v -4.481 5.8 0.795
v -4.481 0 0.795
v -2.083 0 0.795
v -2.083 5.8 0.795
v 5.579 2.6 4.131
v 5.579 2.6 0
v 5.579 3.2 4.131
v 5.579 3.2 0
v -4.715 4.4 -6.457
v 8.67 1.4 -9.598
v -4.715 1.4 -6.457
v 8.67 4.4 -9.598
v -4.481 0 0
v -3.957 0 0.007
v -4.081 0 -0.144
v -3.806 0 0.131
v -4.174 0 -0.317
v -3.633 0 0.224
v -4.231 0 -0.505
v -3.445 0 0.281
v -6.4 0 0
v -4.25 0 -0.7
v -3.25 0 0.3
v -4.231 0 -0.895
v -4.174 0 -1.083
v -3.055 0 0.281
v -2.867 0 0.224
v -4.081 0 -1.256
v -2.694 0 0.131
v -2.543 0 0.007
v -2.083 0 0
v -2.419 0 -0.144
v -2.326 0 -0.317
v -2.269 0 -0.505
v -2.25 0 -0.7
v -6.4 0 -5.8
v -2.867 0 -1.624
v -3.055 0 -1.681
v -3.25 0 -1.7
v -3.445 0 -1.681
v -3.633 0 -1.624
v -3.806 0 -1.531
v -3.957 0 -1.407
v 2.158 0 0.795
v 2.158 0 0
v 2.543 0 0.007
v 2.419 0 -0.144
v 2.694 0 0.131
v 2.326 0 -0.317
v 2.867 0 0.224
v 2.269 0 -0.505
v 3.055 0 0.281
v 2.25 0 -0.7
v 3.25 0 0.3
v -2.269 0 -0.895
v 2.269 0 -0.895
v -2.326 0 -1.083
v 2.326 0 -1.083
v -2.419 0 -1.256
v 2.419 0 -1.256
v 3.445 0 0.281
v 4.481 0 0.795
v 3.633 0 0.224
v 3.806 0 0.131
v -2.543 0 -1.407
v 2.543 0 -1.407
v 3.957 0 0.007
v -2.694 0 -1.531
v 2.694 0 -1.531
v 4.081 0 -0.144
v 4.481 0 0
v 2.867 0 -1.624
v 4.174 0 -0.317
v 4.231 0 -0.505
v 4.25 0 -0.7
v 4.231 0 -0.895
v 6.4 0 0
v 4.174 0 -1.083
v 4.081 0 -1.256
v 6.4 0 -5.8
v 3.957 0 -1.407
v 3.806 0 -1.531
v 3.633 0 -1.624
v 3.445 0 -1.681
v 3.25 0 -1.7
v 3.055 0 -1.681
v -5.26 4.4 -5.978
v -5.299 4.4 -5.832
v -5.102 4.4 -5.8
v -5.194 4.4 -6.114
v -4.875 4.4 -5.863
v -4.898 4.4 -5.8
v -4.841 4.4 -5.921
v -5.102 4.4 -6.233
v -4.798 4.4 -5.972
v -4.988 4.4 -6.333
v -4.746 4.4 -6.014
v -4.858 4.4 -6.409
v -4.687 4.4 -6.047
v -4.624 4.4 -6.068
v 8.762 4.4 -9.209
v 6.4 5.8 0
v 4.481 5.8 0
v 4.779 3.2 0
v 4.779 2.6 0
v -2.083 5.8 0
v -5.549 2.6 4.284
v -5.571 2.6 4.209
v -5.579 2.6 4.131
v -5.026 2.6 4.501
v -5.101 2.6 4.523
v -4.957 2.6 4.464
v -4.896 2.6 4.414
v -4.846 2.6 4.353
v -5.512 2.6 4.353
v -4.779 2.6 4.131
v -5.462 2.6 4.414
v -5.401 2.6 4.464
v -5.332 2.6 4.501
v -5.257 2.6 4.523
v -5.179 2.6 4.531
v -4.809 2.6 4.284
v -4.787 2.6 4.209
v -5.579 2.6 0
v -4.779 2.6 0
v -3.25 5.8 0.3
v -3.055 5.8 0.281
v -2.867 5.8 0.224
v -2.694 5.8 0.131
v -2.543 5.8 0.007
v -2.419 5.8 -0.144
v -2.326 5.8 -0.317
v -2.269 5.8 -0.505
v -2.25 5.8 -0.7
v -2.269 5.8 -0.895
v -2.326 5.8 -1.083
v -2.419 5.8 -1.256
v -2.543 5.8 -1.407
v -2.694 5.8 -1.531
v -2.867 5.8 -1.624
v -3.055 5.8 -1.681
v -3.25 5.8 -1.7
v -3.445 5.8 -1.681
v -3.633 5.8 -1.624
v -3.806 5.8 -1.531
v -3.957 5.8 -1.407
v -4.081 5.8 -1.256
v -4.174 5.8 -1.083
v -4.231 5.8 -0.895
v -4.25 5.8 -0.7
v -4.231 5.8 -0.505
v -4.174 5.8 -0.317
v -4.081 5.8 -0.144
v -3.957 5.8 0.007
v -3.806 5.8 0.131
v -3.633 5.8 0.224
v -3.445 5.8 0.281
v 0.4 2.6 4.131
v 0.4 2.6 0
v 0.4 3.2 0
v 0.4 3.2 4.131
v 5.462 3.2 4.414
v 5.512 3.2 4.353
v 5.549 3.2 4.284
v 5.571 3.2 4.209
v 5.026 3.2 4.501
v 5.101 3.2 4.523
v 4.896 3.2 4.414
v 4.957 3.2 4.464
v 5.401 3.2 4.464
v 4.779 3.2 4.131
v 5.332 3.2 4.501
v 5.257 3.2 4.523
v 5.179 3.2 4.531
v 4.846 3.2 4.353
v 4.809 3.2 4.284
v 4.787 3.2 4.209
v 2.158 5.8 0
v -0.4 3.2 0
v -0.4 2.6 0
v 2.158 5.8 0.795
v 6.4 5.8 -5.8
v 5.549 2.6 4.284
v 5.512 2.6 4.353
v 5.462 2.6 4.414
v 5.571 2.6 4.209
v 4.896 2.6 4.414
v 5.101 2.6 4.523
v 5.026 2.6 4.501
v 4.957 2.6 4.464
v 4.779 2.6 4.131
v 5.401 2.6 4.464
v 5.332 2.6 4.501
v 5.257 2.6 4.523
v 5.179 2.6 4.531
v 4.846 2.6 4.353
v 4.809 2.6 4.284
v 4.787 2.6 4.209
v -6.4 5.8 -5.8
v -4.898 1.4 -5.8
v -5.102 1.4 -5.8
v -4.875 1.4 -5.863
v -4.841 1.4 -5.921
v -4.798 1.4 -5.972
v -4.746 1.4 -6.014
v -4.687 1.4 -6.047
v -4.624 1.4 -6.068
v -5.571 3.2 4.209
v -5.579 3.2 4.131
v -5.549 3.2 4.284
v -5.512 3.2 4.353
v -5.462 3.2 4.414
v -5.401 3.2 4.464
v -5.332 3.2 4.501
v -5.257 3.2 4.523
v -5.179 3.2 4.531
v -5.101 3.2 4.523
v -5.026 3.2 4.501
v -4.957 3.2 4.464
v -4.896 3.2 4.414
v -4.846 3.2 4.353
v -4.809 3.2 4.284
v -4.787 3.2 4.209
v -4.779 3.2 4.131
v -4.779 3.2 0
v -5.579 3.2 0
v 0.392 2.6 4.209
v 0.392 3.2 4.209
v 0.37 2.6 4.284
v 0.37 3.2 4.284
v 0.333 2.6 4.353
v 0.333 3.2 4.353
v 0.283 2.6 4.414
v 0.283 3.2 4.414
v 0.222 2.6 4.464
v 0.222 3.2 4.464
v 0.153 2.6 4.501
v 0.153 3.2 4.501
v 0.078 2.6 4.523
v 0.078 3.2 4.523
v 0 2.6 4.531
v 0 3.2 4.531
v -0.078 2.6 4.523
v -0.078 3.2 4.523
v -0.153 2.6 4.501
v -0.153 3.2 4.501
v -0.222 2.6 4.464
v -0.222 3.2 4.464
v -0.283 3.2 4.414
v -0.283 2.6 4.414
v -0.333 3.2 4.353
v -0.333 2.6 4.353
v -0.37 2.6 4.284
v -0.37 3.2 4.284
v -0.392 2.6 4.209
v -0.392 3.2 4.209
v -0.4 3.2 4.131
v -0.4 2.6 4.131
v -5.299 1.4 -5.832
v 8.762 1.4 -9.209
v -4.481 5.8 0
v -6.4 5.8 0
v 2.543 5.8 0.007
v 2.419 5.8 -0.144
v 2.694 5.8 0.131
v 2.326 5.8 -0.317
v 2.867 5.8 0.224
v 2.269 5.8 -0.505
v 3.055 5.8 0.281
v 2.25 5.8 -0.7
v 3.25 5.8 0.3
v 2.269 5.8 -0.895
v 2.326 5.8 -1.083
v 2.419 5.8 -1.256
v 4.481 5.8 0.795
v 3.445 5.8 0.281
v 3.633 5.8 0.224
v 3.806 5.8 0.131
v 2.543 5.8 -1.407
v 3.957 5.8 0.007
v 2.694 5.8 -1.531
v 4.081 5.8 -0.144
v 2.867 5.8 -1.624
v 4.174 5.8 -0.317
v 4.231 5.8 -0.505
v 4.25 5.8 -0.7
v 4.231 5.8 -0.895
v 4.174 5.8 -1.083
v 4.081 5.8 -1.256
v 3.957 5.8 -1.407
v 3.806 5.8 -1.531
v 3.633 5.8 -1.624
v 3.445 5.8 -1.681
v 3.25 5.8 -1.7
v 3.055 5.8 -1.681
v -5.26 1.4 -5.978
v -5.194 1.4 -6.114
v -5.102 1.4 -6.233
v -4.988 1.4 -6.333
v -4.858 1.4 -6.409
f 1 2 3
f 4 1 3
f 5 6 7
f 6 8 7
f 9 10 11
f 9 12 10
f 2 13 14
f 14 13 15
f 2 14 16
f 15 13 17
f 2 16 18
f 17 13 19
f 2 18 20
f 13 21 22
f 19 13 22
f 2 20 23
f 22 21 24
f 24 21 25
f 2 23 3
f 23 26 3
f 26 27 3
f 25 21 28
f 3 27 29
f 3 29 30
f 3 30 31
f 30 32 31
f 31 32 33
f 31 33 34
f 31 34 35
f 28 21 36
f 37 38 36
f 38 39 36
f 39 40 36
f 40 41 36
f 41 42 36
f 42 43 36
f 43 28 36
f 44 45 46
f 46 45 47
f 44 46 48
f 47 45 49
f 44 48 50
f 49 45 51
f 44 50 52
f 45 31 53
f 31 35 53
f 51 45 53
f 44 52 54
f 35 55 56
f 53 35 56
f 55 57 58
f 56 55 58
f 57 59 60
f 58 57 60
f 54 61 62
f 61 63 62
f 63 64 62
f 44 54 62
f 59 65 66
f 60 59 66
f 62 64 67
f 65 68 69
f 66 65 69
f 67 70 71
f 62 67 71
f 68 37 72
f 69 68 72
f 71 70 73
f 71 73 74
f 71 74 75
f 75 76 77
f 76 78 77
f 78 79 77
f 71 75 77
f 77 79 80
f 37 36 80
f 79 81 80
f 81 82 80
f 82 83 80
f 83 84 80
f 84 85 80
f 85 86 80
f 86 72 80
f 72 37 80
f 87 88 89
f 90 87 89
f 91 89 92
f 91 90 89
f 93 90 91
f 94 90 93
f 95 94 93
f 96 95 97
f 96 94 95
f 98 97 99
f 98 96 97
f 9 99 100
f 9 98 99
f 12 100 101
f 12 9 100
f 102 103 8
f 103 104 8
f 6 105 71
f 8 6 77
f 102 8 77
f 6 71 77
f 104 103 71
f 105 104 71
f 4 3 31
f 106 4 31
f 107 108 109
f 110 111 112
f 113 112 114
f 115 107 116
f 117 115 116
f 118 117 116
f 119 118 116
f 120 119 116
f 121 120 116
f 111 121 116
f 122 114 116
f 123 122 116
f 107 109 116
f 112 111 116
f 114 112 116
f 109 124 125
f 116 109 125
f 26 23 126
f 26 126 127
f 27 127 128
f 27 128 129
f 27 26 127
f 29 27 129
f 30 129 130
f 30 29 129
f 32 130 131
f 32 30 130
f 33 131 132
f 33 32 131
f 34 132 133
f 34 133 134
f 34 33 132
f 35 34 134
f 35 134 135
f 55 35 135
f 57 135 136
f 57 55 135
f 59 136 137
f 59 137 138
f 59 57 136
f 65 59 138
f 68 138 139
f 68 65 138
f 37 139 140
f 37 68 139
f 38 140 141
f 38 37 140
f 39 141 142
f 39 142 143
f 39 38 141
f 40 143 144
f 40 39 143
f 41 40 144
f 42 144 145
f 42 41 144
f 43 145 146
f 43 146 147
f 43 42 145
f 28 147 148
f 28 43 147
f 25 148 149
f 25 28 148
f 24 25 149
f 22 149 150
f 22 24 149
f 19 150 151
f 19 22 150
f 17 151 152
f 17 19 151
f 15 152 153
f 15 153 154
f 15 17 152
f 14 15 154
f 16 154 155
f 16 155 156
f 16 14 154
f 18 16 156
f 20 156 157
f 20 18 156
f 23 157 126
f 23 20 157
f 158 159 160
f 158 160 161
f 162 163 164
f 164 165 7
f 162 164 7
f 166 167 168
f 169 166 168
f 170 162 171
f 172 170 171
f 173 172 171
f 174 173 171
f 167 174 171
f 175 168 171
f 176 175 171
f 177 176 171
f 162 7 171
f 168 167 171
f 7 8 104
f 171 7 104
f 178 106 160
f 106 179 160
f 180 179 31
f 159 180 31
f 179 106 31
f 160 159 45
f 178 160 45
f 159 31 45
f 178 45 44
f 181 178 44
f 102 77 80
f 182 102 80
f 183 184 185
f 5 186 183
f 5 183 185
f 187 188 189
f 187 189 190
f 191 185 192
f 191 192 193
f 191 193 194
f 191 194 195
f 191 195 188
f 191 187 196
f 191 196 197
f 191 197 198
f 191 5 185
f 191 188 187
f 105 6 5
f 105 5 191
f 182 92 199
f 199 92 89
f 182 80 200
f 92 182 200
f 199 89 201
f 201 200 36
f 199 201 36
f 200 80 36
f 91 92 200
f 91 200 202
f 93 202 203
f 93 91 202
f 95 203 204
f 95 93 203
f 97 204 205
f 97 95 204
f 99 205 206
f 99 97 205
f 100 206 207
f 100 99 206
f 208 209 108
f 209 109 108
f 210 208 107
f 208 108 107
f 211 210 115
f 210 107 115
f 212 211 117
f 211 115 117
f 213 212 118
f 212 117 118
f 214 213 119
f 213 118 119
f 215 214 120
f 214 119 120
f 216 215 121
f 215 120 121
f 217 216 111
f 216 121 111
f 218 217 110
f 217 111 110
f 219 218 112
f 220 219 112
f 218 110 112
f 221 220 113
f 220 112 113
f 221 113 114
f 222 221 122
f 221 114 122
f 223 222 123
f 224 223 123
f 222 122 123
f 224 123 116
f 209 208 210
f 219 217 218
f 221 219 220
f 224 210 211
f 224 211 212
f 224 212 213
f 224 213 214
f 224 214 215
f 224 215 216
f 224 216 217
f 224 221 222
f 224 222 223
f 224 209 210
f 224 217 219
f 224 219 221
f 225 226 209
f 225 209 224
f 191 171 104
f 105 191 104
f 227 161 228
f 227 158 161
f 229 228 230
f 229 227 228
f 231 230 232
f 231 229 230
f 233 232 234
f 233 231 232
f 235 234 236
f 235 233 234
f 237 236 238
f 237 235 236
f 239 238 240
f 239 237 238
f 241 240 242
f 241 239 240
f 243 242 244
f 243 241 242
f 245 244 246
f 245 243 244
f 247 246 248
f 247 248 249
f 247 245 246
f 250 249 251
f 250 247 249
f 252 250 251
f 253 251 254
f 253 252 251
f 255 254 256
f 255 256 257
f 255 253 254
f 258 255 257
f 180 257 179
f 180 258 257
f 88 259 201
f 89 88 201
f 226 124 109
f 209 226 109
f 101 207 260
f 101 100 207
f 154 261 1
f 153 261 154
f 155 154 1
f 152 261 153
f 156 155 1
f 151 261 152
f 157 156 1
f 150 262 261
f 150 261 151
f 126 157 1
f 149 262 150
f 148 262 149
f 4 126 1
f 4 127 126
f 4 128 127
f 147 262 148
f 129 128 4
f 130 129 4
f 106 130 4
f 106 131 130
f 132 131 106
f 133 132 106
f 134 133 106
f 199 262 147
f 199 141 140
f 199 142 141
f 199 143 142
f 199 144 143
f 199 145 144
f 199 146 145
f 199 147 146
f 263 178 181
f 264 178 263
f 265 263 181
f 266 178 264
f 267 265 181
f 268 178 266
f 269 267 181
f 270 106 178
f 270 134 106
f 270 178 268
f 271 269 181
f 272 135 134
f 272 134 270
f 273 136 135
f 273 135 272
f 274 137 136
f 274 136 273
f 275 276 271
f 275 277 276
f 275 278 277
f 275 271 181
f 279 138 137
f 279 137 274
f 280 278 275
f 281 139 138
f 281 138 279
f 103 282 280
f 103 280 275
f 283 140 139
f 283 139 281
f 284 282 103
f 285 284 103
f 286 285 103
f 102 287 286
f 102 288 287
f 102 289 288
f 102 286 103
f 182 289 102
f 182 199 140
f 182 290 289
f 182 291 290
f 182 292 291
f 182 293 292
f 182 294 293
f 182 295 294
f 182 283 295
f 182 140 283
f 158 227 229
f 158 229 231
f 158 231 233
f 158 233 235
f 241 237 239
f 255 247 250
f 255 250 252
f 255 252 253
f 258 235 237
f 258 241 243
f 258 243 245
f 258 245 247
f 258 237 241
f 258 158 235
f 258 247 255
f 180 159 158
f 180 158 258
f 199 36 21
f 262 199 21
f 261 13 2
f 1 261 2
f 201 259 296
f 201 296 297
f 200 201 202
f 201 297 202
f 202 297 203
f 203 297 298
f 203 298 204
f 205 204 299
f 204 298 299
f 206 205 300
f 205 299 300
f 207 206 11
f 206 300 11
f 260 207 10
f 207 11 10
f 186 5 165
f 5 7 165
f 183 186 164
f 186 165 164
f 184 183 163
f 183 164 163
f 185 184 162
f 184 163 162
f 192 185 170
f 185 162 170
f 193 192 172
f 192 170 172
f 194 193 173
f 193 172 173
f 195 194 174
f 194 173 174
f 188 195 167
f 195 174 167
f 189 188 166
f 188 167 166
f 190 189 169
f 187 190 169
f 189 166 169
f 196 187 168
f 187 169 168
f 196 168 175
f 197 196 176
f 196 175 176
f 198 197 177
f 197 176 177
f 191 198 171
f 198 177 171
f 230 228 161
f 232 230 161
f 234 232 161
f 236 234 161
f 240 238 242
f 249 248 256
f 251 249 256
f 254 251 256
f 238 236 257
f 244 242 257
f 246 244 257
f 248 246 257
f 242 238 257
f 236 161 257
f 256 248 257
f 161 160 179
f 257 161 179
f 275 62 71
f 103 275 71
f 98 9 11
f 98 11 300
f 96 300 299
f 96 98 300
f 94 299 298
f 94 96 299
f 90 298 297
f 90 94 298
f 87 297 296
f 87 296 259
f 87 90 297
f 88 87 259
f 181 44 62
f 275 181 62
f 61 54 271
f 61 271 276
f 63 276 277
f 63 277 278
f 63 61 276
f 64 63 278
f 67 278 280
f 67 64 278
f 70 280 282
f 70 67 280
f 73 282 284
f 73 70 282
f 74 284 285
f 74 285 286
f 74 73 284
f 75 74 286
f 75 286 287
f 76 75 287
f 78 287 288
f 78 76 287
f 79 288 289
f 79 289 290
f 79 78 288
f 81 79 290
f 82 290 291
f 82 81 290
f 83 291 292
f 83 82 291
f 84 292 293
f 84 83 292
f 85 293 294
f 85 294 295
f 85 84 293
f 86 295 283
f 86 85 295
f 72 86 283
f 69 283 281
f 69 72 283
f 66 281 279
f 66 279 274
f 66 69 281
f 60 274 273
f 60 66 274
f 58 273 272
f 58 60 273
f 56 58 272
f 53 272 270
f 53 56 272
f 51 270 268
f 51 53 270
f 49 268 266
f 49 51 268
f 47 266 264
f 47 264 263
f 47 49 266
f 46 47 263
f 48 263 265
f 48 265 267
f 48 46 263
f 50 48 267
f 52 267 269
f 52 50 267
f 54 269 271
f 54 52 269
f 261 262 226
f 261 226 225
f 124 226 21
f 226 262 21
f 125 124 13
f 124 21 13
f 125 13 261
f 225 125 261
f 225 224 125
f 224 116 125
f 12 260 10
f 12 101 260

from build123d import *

# Parameters (mm, degrees)
SKETCH1_R           = 1
BOSS_EXTRUDE1_DEPTH = 5.8
EXTRUDE_THIN1_DEPTH = 1.5
BOSS_EXTRUDE2_DEPTH = 0.3


with BuildPart() as part:
    # Sketch1 → Boss-Extrude1 (new body)
    with BuildSketch(Plane(origin=(0, 0, 0), x_dir=(1, 0, 0), z_dir=(0, 1, 0))):
        Polygon((6.4, 0), (6.4, 5.8), (-6.4, 5.8), (-6.4, 0), (-4.480616855, 0), (-4.480616855, -0.794991669), (-2.082638034, -0.794991669), (-2.082638034, 0), (2.15791372, 0), (2.15791372, -0.794991669), (4.480616855, -0.794991669), (4.480616855, 0), align=None)
        with Locations(Location((3.25, 0.7, 0), (0, 0, 270))):
            Circle(SKETCH1_R, mode=Mode.SUBTRACT)
        with Locations(Location((-3.25, 0.7, 0), (0, 0, 270))):
            Circle(SKETCH1_R, mode=Mode.SUBTRACT)
    extrude(amount=BOSS_EXTRUDE1_DEPTH)

    # Sketch2 → Extrude-Thin1 (add, symmetric)
    with BuildSketch(Plane(origin=(0, 2.9, 0), x_dir=(1, 0, 0), z_dir=(0, 1, 0))):
        with BuildLine():
            Line((8.670419942, 9.598188691), (-4.715076855, 6.45728949))
            ThreePointArc((-4.715076855, 6.45728949), (-5.101788699, 6.233385099), (-5.299071375, 5.832437755))
            Line((-5.299071375, 5.832437755), (-4.904367476, 5.767562245))
            ThreePointArc((-4.904367476, 5.767562245), (-4.80955319, 5.960258009), (-4.623699024, 6.067866722))
            Line((-4.623699024, 6.067866722), (8.761797773, 9.208765923))
            Line((8.761797773, 9.208765923), (8.670419942, 9.598188691))
        make_face()
    extrude(amount=EXTRUDE_THIN1_DEPTH, both=True)

    # Sketch3 → Boss-Extrude2 (add, symmetric)
    with BuildSketch(Plane(origin=(0, 2.9, 0), x_dir=(1, 0, 0), z_dir=(0, 1, 0))):
        with BuildLine():
            Line((-5.579037079, 0), (-5.579037079, -4.131158505))
            ThreePointArc((-5.579037079, -4.131158505), (-5.179037079, -4.531158505), (-4.779037079, -4.131158505))
            Line((-4.779037079, -4.131158505), (-4.779037079, 0))
            Line((-4.779037079, 0), (-5.579037079, 0))
        make_face()
        with BuildLine():
            Line((-0.4, -4.131158505), (-0.4, 0))
            Line((-0.4, 0), (0.4, 0))
            Line((0.4, 0), (0.4, -4.131158505))
            ThreePointArc((0.4, -4.131158505), (0, -4.531158505), (-0.4, -4.131158505))
        make_face()
        with BuildLine():
            Line((4.779037079, 0), (5.579037079, 0))
            Line((5.579037079, 0), (5.579037079, -4.131158505))
            ThreePointArc((5.579037079, -4.131158505), (5.179037079, -4.531158505), (4.779037079, -4.131158505))
            Line((4.779037079, -4.131158505), (4.779037079, 0))
        make_face()
    extrude(amount=BOSS_EXTRUDE2_DEPTH, both=True)


solid = part.part
